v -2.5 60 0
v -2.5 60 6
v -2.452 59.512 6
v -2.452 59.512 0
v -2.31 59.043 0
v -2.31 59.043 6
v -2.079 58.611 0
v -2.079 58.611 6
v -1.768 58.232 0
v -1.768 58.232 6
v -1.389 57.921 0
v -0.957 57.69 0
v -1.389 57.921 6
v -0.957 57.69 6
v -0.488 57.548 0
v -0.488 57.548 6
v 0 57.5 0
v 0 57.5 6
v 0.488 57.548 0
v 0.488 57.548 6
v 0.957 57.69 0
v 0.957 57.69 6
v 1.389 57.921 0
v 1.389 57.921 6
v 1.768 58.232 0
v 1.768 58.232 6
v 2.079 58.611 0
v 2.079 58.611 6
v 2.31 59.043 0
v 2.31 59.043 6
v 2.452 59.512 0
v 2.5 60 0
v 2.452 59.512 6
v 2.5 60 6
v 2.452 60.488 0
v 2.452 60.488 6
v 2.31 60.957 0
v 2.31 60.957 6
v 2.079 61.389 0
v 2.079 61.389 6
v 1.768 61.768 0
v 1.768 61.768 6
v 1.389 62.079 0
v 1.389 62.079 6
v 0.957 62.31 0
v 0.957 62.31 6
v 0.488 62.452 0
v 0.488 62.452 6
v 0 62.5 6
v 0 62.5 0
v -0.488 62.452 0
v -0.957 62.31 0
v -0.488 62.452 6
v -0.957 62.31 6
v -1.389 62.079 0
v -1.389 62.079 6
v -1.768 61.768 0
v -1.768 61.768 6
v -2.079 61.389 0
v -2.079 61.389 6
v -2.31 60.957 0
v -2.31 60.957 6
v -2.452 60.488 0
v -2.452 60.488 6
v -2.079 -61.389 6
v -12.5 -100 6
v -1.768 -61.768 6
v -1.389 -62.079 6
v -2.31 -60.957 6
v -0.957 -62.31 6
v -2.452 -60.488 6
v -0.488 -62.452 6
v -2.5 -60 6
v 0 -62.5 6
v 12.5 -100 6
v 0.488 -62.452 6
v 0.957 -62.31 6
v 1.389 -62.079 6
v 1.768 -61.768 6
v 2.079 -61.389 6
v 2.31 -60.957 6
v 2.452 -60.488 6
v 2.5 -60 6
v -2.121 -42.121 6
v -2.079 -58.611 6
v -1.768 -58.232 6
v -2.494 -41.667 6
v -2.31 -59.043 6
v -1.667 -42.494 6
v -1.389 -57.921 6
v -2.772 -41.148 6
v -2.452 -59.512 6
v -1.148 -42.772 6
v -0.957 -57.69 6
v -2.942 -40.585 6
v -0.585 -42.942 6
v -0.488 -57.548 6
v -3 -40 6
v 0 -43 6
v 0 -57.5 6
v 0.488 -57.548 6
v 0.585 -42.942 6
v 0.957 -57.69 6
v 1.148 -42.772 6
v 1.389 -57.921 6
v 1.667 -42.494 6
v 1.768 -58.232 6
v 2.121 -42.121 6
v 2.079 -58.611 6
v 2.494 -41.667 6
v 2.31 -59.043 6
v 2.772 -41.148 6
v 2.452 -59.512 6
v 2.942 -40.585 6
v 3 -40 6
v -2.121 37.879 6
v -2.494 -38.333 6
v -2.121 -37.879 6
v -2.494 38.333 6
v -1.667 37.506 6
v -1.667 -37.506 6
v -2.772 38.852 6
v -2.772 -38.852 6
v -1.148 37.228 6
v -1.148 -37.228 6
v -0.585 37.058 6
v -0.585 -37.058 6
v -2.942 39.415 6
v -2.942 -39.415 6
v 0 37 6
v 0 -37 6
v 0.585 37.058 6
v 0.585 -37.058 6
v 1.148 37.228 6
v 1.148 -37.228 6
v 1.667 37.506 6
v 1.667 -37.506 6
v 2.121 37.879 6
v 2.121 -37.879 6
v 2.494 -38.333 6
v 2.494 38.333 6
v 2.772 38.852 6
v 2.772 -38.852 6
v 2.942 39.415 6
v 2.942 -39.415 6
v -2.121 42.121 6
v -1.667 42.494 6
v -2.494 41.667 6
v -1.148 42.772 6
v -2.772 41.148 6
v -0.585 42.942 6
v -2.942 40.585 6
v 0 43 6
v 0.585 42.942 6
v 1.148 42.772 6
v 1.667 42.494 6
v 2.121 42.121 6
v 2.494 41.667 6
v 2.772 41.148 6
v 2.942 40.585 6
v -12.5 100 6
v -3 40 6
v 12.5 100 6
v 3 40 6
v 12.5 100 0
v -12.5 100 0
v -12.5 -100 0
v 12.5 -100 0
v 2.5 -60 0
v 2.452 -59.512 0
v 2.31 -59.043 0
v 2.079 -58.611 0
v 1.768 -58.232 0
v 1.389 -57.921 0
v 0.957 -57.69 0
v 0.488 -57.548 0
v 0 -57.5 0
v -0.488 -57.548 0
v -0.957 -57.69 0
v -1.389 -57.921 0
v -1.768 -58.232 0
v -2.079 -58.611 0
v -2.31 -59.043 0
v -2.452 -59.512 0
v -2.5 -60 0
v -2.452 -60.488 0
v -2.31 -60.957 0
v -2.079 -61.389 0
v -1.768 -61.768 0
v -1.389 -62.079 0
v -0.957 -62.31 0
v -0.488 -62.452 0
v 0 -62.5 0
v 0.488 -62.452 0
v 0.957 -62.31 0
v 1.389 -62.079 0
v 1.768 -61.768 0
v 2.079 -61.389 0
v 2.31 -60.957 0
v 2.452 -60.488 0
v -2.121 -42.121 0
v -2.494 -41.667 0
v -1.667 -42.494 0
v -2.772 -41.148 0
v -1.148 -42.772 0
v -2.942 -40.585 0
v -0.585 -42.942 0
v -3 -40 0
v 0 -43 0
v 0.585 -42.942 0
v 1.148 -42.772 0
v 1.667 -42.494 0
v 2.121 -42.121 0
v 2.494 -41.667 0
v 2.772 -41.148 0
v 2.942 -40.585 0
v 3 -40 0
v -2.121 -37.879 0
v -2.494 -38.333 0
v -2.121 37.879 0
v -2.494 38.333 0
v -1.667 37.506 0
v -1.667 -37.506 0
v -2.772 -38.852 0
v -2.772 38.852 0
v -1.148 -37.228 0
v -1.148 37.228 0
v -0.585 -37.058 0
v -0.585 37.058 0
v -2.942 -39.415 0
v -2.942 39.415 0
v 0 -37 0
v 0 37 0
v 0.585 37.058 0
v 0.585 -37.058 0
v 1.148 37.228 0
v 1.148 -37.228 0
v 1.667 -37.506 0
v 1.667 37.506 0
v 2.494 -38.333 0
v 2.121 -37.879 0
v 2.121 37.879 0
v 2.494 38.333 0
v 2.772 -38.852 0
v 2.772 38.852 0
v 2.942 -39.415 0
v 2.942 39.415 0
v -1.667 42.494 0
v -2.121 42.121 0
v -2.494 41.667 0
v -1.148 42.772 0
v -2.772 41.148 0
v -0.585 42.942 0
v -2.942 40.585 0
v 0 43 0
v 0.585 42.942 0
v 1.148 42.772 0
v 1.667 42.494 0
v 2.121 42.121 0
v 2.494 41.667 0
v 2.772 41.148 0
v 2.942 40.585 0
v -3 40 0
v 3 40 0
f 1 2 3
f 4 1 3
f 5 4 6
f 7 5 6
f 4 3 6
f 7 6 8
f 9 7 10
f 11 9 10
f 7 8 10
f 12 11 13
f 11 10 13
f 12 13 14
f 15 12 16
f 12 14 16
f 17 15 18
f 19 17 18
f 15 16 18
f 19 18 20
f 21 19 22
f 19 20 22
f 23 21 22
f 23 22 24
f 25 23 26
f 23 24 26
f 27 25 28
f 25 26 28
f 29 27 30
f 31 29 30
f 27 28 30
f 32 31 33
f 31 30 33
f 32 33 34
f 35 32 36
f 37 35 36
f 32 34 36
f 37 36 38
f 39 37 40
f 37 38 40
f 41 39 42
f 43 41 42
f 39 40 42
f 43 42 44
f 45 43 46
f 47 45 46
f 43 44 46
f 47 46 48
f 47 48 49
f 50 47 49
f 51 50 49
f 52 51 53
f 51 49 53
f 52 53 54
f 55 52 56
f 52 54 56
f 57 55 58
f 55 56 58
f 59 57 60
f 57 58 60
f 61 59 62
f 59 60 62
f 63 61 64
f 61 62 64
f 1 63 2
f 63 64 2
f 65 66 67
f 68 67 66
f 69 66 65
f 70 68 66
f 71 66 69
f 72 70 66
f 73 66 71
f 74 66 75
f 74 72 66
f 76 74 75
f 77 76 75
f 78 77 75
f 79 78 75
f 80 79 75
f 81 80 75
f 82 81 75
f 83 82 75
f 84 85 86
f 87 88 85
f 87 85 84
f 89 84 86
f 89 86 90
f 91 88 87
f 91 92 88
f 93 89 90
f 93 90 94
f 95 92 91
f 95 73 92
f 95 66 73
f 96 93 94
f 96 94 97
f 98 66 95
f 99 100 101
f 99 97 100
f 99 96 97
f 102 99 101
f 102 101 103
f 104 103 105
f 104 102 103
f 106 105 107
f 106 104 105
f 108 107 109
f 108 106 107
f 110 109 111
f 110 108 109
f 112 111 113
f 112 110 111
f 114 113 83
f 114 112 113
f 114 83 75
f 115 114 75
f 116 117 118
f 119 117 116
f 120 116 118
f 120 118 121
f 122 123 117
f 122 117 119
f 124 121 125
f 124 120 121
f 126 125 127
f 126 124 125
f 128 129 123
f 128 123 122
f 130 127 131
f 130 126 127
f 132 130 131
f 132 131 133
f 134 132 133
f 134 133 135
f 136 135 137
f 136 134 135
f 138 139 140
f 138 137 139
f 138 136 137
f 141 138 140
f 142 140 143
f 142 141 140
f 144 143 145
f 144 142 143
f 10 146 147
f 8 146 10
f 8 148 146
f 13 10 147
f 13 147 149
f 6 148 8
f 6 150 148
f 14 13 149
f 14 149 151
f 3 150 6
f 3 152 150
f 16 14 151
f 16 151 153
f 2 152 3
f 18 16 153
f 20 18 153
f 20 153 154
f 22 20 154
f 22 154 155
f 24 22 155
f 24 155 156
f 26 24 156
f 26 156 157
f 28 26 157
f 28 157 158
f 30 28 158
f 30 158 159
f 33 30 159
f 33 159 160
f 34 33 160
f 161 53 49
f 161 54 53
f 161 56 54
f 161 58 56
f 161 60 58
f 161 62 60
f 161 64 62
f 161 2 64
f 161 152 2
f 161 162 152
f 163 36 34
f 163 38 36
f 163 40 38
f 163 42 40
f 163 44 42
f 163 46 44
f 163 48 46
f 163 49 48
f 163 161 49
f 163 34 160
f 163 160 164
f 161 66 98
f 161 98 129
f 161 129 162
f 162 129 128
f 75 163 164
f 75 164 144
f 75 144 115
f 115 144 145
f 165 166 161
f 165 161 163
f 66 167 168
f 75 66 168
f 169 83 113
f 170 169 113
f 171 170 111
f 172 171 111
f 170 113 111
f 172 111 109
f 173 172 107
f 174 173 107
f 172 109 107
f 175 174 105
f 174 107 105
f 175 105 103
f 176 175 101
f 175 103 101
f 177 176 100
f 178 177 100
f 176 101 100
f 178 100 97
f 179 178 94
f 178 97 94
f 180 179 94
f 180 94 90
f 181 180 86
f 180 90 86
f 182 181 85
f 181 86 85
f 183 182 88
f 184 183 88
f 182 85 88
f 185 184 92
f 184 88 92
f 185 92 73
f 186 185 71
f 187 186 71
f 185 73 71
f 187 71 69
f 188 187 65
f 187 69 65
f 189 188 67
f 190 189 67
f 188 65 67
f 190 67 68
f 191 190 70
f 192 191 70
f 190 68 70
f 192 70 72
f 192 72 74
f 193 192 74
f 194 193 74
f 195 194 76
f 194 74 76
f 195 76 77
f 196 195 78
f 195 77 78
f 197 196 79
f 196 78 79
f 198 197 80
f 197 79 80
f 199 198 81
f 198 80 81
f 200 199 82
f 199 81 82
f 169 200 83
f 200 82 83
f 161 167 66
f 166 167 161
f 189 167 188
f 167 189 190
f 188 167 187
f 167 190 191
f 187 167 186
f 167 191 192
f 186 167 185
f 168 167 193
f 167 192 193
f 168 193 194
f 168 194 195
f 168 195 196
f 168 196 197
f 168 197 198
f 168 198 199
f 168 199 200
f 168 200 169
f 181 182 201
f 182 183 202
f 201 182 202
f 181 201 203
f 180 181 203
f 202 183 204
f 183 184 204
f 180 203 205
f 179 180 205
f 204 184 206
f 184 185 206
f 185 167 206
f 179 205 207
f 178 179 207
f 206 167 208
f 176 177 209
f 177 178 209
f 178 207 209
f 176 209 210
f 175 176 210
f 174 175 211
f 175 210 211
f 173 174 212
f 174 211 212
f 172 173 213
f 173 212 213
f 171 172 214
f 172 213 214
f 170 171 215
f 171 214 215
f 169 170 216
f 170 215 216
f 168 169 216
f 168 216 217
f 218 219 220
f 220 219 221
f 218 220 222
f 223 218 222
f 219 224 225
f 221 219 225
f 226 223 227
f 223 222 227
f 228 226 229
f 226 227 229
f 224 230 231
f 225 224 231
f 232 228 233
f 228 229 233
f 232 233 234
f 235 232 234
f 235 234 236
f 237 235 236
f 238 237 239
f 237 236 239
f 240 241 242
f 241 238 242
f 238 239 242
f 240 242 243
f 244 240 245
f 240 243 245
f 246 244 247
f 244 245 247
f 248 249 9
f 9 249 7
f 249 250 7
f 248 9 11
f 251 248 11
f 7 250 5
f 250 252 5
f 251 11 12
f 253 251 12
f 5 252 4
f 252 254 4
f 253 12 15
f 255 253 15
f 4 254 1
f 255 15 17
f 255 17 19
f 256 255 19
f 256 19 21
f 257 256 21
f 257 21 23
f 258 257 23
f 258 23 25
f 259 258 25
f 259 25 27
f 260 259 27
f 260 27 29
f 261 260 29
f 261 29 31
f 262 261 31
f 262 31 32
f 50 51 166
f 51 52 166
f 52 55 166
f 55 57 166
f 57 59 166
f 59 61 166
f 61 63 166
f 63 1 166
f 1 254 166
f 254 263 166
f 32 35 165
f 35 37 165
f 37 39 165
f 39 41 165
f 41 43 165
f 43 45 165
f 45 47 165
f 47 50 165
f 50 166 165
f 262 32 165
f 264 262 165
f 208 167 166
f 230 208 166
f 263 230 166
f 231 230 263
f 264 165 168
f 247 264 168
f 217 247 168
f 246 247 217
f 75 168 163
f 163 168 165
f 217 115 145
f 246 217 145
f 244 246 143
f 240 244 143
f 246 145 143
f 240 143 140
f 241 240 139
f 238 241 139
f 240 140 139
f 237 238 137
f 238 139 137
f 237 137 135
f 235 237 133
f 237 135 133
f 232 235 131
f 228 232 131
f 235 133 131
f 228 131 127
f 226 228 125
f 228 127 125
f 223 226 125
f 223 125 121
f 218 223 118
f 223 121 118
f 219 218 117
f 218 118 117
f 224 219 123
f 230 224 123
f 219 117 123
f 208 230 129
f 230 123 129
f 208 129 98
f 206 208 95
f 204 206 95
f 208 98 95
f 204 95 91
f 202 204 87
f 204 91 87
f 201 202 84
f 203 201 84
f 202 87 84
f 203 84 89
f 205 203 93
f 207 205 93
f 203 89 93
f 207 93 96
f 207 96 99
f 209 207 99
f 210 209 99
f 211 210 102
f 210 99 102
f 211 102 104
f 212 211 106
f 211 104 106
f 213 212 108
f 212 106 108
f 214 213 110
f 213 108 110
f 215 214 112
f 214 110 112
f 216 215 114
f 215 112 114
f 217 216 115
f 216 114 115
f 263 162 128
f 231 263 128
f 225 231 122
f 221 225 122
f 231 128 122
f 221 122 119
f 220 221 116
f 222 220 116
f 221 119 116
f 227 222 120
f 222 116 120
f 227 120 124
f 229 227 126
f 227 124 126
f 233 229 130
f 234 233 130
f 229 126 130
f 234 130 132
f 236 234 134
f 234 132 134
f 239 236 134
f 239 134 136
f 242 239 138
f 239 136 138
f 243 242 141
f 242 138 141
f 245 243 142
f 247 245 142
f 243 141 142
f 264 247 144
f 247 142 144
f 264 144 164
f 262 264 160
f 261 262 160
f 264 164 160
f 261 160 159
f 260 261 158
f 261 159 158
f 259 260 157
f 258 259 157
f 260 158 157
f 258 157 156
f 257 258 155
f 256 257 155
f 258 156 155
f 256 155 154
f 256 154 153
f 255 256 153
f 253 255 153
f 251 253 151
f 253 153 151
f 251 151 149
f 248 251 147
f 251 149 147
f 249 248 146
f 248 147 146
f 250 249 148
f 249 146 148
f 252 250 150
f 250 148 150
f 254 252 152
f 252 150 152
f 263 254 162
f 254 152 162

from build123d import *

# Parameters (mm, degrees)
SKETCH1_W           = 25
SKETCH1_H           = 200
BOSS_EXTRUDE1_DEPTH = 6
SKETCH2_R           = 2.5
SKETCH2_R_2         = 3
CUT_EXTRUDE1_DEPTH  = 6


with BuildPart() as part:
    # Sketch1 → Boss-Extrude1 (new body)
    with BuildSketch(Plane.XY):
        Rectangle(SKETCH1_W, SKETCH1_H)
    extrude(amount=BOSS_EXTRUDE1_DEPTH)

    # Sketch2 → Cut-Extrude1 (cut)
    with BuildSketch(Plane.XY.offset(6)):
        with Locations((0, -60)):
            Circle(SKETCH2_R)
        with Locations(Location((0, 60, 0), (0, 0, 180))):
            Circle(SKETCH2_R)
        with Locations((0, -40)):
            Circle(SKETCH2_R_2)
        with Locations(Location((0, 40, 0), (0, 0, 180))):
            Circle(SKETCH2_R_2)
    extrude(amount=-CUT_EXTRUDE1_DEPTH, mode=Mode.SUBTRACT)


solid = part.part
